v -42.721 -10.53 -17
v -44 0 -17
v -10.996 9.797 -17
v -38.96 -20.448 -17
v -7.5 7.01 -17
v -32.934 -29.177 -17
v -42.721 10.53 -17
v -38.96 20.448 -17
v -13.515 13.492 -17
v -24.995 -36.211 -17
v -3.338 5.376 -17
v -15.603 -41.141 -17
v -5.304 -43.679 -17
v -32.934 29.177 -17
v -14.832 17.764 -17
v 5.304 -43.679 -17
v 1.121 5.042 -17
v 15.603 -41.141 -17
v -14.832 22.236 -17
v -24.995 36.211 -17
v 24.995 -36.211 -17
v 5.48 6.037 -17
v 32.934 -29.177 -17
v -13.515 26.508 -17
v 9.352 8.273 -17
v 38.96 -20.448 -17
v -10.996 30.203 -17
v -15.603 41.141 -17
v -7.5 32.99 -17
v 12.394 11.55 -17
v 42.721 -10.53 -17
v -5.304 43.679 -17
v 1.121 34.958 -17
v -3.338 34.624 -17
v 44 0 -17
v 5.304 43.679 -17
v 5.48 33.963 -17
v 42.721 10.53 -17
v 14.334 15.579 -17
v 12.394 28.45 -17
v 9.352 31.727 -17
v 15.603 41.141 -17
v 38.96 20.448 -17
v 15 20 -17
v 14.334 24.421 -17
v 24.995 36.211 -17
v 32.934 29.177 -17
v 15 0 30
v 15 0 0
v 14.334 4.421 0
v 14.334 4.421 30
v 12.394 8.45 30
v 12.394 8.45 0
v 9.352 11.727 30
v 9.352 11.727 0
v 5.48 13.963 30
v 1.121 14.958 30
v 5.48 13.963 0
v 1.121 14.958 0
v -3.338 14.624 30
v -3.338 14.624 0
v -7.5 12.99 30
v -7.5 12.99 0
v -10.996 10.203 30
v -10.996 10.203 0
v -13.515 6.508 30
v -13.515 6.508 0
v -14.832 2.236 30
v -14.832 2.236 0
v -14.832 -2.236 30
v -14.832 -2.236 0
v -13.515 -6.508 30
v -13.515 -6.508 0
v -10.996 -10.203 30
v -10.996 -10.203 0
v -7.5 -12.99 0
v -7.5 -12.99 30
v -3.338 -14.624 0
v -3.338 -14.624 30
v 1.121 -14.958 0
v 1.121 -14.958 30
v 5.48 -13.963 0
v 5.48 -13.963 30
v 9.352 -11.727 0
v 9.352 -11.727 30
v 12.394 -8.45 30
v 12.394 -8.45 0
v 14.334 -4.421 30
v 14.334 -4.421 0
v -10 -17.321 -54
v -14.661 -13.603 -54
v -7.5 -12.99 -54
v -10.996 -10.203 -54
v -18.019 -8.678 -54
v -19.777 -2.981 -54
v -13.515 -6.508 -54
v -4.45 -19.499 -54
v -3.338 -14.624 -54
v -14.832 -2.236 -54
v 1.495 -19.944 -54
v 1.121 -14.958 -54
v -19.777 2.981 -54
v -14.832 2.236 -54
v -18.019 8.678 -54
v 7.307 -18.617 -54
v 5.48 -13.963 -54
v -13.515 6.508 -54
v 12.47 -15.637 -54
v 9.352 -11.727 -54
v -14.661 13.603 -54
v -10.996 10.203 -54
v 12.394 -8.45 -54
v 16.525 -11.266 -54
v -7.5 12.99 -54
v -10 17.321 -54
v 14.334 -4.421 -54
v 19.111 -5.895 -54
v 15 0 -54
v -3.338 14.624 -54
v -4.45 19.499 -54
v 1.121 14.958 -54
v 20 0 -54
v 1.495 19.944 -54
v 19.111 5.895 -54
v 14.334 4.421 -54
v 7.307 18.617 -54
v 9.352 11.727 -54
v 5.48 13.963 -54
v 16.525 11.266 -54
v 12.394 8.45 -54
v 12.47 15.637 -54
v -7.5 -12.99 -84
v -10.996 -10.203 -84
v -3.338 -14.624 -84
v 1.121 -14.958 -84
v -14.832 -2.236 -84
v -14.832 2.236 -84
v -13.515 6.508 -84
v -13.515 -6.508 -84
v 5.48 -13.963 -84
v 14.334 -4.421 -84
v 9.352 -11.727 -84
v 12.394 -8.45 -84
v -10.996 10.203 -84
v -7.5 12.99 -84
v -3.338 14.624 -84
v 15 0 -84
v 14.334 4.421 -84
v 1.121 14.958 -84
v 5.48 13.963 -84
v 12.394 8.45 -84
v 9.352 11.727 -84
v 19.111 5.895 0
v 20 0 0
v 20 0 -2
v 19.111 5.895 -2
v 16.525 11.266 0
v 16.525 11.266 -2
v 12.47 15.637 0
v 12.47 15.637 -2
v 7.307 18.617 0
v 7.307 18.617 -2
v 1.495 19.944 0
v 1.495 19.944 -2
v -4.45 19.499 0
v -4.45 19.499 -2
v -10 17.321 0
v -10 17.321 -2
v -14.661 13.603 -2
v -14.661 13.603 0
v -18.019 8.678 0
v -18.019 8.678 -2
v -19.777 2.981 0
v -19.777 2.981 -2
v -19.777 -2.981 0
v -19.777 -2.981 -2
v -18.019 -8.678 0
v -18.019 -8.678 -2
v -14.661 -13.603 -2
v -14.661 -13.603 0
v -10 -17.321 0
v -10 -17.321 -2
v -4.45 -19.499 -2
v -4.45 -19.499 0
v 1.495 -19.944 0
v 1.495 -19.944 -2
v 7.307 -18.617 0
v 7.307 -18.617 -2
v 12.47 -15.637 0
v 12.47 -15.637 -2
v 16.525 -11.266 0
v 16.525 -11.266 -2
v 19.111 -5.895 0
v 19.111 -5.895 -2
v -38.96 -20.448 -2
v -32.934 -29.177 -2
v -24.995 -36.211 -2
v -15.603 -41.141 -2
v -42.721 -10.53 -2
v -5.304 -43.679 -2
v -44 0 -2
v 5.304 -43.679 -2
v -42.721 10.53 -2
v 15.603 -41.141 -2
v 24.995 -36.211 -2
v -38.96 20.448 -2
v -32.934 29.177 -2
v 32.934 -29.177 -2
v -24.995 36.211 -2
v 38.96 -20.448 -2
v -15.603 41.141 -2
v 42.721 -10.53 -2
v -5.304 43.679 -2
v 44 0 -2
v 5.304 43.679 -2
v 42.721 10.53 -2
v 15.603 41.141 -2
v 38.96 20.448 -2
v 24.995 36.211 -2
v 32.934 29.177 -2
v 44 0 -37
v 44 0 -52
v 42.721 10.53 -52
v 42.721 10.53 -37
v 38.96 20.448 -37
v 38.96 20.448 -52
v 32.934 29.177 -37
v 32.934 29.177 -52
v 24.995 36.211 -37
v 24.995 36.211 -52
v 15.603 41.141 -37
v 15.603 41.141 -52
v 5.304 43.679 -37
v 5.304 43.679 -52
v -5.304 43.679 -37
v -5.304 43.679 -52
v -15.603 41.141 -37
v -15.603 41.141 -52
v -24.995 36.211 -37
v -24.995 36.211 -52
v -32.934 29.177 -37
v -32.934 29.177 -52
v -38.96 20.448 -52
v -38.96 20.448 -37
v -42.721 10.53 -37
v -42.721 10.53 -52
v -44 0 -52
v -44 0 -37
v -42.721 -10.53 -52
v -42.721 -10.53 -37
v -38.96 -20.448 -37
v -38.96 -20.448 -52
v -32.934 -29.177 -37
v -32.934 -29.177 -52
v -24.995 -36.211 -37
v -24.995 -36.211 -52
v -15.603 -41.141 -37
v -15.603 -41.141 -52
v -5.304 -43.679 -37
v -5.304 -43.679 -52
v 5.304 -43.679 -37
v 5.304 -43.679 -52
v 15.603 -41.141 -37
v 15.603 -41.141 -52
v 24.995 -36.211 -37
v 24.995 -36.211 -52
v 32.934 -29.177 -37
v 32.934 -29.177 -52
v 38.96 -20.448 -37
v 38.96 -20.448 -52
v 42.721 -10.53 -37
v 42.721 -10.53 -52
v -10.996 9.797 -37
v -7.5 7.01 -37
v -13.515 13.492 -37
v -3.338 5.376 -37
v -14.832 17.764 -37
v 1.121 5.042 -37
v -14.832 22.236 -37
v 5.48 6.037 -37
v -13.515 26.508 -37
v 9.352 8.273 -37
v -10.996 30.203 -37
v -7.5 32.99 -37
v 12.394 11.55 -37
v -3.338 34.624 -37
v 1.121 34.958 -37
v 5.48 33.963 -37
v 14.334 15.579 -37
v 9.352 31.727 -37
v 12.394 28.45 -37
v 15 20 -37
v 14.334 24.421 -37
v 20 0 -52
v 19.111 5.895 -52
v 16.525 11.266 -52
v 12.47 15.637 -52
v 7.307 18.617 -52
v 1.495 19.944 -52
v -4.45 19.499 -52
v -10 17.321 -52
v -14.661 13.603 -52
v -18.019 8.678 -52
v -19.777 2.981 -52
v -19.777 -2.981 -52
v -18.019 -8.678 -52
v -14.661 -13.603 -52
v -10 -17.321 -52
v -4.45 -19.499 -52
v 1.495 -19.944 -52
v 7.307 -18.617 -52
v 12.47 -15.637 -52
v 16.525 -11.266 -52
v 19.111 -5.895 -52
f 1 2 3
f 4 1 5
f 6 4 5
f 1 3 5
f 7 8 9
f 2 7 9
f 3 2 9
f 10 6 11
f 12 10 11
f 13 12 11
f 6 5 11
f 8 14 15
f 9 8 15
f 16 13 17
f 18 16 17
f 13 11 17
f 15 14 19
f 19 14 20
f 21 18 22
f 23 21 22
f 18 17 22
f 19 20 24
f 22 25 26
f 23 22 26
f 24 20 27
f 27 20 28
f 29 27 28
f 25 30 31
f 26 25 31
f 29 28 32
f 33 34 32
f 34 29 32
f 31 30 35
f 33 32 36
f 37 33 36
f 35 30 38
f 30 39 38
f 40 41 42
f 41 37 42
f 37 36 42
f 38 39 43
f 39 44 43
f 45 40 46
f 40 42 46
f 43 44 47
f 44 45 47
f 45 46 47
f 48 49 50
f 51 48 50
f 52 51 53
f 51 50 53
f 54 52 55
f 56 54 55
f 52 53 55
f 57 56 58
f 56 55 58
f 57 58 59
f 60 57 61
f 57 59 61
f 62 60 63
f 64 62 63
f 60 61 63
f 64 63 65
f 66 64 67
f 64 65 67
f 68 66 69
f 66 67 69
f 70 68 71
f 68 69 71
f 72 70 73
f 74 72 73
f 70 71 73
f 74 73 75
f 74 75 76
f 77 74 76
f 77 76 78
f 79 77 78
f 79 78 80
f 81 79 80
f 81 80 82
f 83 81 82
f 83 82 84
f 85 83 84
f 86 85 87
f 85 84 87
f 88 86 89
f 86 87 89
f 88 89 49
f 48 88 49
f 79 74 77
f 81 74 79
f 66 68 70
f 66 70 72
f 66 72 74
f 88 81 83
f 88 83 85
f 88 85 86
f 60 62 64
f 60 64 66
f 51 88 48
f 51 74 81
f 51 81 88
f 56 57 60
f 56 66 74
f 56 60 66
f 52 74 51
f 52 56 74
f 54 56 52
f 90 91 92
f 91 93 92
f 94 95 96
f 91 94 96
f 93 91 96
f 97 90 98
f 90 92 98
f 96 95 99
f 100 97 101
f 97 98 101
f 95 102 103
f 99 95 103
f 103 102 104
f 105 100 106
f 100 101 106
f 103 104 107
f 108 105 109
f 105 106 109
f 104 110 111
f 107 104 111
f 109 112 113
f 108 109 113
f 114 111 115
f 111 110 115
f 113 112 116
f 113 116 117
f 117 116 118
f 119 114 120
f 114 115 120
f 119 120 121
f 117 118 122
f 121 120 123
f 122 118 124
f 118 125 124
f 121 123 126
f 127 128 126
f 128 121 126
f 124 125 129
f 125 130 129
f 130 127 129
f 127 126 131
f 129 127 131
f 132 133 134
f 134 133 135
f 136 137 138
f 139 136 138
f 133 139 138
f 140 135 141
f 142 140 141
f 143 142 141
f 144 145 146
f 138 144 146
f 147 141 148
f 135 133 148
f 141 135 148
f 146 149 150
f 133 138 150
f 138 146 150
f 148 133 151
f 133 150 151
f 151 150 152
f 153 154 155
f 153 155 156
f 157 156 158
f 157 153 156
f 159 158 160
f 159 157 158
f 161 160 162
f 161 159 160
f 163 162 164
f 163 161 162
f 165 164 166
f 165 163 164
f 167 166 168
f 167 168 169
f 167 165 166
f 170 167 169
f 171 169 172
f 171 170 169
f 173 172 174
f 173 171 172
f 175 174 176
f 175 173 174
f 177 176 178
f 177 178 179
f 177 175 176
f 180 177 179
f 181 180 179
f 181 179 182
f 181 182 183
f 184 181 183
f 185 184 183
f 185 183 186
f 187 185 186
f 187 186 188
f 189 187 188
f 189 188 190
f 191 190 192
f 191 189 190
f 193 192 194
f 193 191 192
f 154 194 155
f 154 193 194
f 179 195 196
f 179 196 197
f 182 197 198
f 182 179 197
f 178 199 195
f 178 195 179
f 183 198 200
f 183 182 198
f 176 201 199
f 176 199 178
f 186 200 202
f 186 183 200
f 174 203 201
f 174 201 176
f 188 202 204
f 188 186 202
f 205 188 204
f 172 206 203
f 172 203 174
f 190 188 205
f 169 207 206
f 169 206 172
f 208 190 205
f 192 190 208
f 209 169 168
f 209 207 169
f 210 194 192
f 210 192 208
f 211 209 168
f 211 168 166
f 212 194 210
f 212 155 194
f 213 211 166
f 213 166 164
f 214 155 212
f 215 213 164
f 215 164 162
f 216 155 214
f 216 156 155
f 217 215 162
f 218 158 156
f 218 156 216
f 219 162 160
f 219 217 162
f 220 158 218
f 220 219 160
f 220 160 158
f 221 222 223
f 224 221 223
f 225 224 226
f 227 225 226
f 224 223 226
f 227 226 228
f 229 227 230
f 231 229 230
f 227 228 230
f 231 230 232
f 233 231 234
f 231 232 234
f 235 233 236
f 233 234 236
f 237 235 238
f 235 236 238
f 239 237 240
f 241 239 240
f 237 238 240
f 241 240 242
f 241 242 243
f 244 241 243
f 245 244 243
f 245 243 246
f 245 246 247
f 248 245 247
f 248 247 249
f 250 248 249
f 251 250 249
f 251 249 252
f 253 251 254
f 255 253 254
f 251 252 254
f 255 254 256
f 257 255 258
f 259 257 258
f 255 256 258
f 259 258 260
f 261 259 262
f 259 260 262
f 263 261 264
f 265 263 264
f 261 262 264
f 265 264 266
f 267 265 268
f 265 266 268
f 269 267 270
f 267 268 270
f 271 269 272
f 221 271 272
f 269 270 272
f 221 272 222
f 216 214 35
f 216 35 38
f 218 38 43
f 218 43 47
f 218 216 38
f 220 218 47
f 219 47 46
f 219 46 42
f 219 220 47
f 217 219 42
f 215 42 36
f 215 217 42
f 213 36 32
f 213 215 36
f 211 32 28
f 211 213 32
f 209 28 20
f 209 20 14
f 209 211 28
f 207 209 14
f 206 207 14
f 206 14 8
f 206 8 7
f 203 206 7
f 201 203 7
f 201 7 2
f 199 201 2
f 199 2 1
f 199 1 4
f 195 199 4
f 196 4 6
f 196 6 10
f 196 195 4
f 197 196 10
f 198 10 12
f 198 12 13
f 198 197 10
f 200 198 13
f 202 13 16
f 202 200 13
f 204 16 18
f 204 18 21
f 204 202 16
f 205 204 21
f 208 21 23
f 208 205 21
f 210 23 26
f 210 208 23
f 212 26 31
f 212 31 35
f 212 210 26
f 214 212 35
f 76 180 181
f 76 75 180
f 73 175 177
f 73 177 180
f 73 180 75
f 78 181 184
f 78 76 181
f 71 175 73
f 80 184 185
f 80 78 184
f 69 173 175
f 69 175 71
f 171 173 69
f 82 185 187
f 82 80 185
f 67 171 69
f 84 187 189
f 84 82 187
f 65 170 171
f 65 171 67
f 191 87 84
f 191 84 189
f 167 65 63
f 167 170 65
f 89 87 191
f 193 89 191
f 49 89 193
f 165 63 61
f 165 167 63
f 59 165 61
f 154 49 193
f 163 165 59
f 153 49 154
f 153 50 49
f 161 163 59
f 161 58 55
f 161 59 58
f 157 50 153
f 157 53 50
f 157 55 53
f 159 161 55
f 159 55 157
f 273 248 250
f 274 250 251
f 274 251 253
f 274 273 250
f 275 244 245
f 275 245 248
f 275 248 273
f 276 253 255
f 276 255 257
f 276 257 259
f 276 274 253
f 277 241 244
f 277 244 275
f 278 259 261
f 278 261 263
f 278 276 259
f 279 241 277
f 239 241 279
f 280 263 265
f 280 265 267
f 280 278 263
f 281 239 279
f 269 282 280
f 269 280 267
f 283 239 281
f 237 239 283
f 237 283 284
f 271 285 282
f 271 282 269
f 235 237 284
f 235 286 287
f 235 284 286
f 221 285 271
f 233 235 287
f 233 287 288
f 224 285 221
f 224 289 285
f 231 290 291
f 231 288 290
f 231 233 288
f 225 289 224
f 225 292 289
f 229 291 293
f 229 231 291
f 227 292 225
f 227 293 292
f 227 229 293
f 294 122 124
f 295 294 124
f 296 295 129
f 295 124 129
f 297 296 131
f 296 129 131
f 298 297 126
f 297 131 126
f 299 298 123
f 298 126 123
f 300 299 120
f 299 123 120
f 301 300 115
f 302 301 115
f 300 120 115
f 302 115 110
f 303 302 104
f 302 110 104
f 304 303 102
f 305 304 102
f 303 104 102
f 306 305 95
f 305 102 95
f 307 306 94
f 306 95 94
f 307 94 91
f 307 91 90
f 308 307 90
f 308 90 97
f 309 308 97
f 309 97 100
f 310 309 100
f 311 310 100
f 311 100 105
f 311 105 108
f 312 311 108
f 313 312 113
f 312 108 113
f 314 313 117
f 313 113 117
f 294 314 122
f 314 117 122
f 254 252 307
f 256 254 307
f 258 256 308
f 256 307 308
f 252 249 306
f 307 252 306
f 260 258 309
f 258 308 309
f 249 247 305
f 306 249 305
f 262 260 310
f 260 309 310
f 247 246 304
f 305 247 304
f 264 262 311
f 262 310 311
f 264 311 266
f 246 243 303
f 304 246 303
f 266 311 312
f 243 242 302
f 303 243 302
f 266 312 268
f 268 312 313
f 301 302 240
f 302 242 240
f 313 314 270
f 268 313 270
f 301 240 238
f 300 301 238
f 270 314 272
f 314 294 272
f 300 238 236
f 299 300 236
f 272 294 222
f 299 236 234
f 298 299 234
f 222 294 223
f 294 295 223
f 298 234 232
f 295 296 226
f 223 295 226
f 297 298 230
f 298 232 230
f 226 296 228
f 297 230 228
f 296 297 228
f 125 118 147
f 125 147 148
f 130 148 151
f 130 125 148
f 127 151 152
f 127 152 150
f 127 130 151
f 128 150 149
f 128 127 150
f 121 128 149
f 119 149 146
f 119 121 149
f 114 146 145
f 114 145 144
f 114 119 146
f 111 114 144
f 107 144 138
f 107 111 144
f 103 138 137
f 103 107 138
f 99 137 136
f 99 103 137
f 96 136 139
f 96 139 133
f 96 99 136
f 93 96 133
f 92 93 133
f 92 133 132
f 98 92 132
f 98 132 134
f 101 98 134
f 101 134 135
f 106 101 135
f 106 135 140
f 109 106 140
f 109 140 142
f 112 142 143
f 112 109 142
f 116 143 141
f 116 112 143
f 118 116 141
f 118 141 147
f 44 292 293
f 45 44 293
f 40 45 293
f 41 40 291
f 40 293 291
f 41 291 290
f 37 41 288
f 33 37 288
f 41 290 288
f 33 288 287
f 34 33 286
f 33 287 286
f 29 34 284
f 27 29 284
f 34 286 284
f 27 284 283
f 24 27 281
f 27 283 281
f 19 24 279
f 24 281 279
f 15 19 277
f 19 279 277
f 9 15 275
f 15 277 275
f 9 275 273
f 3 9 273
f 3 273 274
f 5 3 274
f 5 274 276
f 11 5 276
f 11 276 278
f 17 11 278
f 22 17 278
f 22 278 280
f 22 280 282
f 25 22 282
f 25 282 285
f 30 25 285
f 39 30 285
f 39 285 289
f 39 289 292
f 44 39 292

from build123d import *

# Parameters (mm, degrees)
SZKIC1_R                    = 15
DODANIE_WYCI_GNI_CIE1_DEPTH = 30
SZKIC2_R                    = 20
DODANIE_WYCI_GNI_CIE2_DEPTH = 2
DODANIE_WYCI_GNI_CIE3_START = -2
SZKIC3_R                    = 44
DODANIE_WYCI_GNI_CIE3_DEPTH = 15
DODANIE_WYCI_GNI_CIE4_START = -17
SZKIC4_R                    = 15
DODANIE_WYCI_GNI_CIE4_DEPTH = 10


with BuildPart() as part:
    # Szkic1 → Dodanie-wyciągnięcie1 (new body)
    with BuildSketch(Plane.XY):
        Circle(SZKIC1_R)
    extrude(amount=DODANIE_WYCI_GNI_CIE1_DEPTH)

    # Szkic2 → Dodanie-wyciągnięcie2 (add)
    with BuildSketch(Plane.XY):
        Circle(SZKIC2_R)
    extrude(amount=-DODANIE_WYCI_GNI_CIE2_DEPTH)

    # Szkic3 → Dodanie-wyciągnięcie3 (add)
    with BuildSketch(Plane.XY.offset(DODANIE_WYCI_GNI_CIE3_START)):
        Circle(SZKIC3_R)
    extrude(amount=-DODANIE_WYCI_GNI_CIE3_DEPTH)

    # Szkic4 → Dodanie-wyciągnięcie4 (add)
    with BuildSketch(Plane.XY.offset(DODANIE_WYCI_GNI_CIE4_START)):
        with Locations((0, 20)):
            Circle(SZKIC4_R)
    extrude(amount=-DODANIE_WYCI_GNI_CIE4_DEPTH)

    # Lustro2: part across plane


with BuildPart() as part_1:
    add(part.part)
    add(part.part.mirror(Plane(origin=(0, 20, -27), x_dir=(1, 0, 0), z_dir=(0, 0, 1))))


solid = part_1.part
